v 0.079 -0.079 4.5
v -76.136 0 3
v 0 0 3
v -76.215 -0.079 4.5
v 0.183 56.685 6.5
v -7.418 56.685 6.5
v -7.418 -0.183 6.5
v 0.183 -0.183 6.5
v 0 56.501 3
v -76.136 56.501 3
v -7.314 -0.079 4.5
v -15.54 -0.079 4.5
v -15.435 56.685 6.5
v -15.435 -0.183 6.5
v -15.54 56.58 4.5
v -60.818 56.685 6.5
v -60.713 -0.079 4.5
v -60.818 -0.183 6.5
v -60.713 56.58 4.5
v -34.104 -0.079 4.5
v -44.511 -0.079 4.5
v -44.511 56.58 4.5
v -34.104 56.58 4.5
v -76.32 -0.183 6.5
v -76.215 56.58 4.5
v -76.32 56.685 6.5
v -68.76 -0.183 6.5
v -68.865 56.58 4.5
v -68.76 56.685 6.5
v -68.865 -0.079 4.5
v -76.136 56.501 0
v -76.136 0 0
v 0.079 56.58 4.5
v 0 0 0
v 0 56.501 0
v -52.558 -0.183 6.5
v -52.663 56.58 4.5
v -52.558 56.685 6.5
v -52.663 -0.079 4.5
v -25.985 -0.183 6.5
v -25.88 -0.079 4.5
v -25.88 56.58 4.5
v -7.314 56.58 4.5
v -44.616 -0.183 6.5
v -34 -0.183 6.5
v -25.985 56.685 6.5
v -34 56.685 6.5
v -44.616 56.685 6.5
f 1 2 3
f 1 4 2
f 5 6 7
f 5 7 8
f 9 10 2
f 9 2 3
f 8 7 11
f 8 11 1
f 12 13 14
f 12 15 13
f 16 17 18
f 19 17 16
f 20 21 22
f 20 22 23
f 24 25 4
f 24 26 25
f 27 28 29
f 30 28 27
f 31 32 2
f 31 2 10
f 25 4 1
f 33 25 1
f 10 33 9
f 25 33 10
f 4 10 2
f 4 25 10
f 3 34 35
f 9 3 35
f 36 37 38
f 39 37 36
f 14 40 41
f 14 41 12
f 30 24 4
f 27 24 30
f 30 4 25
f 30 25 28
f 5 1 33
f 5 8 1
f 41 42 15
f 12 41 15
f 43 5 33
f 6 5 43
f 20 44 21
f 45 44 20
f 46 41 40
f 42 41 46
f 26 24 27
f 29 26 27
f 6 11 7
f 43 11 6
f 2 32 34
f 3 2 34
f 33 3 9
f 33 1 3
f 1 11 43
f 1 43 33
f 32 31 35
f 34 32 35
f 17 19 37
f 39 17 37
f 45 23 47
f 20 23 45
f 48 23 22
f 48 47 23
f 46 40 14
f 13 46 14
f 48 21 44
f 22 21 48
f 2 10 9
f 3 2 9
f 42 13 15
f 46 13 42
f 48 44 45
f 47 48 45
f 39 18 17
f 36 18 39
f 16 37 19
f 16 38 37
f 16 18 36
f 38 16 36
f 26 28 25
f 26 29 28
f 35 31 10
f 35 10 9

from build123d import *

# Parameters (mm, degrees)
F0_W      = 76.1363953352
F0_H      = 56.5012171865
F1_DEPTH  = 3
F2_W      = 76.1363953352
F2_H      = 56.5012171865
F3_DEPTH  = 1.5
F3_TAPER  = -3
F4_W      = 76.293618673
F4_H      = 56.6584405243
F5_DEPTH  = 2
F5_TAPER  = -3
F6_W      = 7.9422779381
F6_H      = 56.8680716414
F7_DEPTH  = 2
F7_TAPER  = -3
F8_W      = 7.9422742128
F8_H      = 56.8680716414
F9_DEPTH  = 2
F9_TAPER  = -3
F10_W     = 8.0143567175
F10_H     = 56.8680716414
F11_DEPTH = 2
F11_TAPER = -3
F12_W     = 8.0169183202
F12_H     = 56.8680716414
F13_DEPTH = 2
F13_TAPER = -3


with BuildPart() as f1:
    # F0 (on Top) → F1 (new body)
    with BuildSketch(Plane.XY):
        with Locations((-38.0681976676, 28.2506085932)):
            Rectangle(F0_W, F0_H)
    extrude(amount=F1_DEPTH)


with BuildPart() as f3:
    # F2 (on face) → F3 (new body)
    with BuildSketch(Plane.XY.offset(3)):
        with Locations((-38.0681976676, 28.2506085932)):
            Rectangle(F2_W, F2_H)
    extrude(amount=F3_DEPTH, taper=F3_TAPER)


with BuildPart() as f5:
    # F4 (on face) → F5 (new body)
    with BuildSketch(Plane.XY.offset(4.5)):
        with Locations((-38.0681976676, 28.2506085932)):
            Rectangle(F4_W, F4_H)
    extrude(amount=F5_DEPTH, taper=F5_TAPER)

    # F6 (on face) → F7 (cut)
    with BuildSketch(Plane.XY.offset(6.5)):
        with Locations((-64.788883552, 28.2506085932)):
            Rectangle(F6_W, F6_H)
    extrude(amount=-F7_DEPTH, taper=F7_TAPER, mode=Mode.SUBTRACT)

    # F8 (on face) → F9 (cut)
    with BuildSketch(Plane.XY.offset(6.5)):
        with Locations((-48.586640507, 28.2506085932)):
            Rectangle(F8_W, F8_H)
    extrude(amount=-F9_DEPTH, taper=F9_TAPER, mode=Mode.SUBTRACT)

    # F10 (on face) → F11 (cut)
    with BuildSketch(Plane.XY.offset(6.5)):
        with Locations((-29.9924211577, 28.2506085932)):
            Rectangle(F10_W, F10_H)
    extrude(amount=-F11_DEPTH, taper=F11_TAPER, mode=Mode.SUBTRACT)

    # F12 (on face) → F13 (cut)
    with BuildSketch(Plane.XY.offset(6.5)):
        with Locations((-11.4268527832, 28.2506085932)):
            Rectangle(F12_W, F12_H)
    extrude(amount=-F13_DEPTH, taper=F13_TAPER, mode=Mode.SUBTRACT)


solid = Compound([f1.part, f3.part, f5.part])
